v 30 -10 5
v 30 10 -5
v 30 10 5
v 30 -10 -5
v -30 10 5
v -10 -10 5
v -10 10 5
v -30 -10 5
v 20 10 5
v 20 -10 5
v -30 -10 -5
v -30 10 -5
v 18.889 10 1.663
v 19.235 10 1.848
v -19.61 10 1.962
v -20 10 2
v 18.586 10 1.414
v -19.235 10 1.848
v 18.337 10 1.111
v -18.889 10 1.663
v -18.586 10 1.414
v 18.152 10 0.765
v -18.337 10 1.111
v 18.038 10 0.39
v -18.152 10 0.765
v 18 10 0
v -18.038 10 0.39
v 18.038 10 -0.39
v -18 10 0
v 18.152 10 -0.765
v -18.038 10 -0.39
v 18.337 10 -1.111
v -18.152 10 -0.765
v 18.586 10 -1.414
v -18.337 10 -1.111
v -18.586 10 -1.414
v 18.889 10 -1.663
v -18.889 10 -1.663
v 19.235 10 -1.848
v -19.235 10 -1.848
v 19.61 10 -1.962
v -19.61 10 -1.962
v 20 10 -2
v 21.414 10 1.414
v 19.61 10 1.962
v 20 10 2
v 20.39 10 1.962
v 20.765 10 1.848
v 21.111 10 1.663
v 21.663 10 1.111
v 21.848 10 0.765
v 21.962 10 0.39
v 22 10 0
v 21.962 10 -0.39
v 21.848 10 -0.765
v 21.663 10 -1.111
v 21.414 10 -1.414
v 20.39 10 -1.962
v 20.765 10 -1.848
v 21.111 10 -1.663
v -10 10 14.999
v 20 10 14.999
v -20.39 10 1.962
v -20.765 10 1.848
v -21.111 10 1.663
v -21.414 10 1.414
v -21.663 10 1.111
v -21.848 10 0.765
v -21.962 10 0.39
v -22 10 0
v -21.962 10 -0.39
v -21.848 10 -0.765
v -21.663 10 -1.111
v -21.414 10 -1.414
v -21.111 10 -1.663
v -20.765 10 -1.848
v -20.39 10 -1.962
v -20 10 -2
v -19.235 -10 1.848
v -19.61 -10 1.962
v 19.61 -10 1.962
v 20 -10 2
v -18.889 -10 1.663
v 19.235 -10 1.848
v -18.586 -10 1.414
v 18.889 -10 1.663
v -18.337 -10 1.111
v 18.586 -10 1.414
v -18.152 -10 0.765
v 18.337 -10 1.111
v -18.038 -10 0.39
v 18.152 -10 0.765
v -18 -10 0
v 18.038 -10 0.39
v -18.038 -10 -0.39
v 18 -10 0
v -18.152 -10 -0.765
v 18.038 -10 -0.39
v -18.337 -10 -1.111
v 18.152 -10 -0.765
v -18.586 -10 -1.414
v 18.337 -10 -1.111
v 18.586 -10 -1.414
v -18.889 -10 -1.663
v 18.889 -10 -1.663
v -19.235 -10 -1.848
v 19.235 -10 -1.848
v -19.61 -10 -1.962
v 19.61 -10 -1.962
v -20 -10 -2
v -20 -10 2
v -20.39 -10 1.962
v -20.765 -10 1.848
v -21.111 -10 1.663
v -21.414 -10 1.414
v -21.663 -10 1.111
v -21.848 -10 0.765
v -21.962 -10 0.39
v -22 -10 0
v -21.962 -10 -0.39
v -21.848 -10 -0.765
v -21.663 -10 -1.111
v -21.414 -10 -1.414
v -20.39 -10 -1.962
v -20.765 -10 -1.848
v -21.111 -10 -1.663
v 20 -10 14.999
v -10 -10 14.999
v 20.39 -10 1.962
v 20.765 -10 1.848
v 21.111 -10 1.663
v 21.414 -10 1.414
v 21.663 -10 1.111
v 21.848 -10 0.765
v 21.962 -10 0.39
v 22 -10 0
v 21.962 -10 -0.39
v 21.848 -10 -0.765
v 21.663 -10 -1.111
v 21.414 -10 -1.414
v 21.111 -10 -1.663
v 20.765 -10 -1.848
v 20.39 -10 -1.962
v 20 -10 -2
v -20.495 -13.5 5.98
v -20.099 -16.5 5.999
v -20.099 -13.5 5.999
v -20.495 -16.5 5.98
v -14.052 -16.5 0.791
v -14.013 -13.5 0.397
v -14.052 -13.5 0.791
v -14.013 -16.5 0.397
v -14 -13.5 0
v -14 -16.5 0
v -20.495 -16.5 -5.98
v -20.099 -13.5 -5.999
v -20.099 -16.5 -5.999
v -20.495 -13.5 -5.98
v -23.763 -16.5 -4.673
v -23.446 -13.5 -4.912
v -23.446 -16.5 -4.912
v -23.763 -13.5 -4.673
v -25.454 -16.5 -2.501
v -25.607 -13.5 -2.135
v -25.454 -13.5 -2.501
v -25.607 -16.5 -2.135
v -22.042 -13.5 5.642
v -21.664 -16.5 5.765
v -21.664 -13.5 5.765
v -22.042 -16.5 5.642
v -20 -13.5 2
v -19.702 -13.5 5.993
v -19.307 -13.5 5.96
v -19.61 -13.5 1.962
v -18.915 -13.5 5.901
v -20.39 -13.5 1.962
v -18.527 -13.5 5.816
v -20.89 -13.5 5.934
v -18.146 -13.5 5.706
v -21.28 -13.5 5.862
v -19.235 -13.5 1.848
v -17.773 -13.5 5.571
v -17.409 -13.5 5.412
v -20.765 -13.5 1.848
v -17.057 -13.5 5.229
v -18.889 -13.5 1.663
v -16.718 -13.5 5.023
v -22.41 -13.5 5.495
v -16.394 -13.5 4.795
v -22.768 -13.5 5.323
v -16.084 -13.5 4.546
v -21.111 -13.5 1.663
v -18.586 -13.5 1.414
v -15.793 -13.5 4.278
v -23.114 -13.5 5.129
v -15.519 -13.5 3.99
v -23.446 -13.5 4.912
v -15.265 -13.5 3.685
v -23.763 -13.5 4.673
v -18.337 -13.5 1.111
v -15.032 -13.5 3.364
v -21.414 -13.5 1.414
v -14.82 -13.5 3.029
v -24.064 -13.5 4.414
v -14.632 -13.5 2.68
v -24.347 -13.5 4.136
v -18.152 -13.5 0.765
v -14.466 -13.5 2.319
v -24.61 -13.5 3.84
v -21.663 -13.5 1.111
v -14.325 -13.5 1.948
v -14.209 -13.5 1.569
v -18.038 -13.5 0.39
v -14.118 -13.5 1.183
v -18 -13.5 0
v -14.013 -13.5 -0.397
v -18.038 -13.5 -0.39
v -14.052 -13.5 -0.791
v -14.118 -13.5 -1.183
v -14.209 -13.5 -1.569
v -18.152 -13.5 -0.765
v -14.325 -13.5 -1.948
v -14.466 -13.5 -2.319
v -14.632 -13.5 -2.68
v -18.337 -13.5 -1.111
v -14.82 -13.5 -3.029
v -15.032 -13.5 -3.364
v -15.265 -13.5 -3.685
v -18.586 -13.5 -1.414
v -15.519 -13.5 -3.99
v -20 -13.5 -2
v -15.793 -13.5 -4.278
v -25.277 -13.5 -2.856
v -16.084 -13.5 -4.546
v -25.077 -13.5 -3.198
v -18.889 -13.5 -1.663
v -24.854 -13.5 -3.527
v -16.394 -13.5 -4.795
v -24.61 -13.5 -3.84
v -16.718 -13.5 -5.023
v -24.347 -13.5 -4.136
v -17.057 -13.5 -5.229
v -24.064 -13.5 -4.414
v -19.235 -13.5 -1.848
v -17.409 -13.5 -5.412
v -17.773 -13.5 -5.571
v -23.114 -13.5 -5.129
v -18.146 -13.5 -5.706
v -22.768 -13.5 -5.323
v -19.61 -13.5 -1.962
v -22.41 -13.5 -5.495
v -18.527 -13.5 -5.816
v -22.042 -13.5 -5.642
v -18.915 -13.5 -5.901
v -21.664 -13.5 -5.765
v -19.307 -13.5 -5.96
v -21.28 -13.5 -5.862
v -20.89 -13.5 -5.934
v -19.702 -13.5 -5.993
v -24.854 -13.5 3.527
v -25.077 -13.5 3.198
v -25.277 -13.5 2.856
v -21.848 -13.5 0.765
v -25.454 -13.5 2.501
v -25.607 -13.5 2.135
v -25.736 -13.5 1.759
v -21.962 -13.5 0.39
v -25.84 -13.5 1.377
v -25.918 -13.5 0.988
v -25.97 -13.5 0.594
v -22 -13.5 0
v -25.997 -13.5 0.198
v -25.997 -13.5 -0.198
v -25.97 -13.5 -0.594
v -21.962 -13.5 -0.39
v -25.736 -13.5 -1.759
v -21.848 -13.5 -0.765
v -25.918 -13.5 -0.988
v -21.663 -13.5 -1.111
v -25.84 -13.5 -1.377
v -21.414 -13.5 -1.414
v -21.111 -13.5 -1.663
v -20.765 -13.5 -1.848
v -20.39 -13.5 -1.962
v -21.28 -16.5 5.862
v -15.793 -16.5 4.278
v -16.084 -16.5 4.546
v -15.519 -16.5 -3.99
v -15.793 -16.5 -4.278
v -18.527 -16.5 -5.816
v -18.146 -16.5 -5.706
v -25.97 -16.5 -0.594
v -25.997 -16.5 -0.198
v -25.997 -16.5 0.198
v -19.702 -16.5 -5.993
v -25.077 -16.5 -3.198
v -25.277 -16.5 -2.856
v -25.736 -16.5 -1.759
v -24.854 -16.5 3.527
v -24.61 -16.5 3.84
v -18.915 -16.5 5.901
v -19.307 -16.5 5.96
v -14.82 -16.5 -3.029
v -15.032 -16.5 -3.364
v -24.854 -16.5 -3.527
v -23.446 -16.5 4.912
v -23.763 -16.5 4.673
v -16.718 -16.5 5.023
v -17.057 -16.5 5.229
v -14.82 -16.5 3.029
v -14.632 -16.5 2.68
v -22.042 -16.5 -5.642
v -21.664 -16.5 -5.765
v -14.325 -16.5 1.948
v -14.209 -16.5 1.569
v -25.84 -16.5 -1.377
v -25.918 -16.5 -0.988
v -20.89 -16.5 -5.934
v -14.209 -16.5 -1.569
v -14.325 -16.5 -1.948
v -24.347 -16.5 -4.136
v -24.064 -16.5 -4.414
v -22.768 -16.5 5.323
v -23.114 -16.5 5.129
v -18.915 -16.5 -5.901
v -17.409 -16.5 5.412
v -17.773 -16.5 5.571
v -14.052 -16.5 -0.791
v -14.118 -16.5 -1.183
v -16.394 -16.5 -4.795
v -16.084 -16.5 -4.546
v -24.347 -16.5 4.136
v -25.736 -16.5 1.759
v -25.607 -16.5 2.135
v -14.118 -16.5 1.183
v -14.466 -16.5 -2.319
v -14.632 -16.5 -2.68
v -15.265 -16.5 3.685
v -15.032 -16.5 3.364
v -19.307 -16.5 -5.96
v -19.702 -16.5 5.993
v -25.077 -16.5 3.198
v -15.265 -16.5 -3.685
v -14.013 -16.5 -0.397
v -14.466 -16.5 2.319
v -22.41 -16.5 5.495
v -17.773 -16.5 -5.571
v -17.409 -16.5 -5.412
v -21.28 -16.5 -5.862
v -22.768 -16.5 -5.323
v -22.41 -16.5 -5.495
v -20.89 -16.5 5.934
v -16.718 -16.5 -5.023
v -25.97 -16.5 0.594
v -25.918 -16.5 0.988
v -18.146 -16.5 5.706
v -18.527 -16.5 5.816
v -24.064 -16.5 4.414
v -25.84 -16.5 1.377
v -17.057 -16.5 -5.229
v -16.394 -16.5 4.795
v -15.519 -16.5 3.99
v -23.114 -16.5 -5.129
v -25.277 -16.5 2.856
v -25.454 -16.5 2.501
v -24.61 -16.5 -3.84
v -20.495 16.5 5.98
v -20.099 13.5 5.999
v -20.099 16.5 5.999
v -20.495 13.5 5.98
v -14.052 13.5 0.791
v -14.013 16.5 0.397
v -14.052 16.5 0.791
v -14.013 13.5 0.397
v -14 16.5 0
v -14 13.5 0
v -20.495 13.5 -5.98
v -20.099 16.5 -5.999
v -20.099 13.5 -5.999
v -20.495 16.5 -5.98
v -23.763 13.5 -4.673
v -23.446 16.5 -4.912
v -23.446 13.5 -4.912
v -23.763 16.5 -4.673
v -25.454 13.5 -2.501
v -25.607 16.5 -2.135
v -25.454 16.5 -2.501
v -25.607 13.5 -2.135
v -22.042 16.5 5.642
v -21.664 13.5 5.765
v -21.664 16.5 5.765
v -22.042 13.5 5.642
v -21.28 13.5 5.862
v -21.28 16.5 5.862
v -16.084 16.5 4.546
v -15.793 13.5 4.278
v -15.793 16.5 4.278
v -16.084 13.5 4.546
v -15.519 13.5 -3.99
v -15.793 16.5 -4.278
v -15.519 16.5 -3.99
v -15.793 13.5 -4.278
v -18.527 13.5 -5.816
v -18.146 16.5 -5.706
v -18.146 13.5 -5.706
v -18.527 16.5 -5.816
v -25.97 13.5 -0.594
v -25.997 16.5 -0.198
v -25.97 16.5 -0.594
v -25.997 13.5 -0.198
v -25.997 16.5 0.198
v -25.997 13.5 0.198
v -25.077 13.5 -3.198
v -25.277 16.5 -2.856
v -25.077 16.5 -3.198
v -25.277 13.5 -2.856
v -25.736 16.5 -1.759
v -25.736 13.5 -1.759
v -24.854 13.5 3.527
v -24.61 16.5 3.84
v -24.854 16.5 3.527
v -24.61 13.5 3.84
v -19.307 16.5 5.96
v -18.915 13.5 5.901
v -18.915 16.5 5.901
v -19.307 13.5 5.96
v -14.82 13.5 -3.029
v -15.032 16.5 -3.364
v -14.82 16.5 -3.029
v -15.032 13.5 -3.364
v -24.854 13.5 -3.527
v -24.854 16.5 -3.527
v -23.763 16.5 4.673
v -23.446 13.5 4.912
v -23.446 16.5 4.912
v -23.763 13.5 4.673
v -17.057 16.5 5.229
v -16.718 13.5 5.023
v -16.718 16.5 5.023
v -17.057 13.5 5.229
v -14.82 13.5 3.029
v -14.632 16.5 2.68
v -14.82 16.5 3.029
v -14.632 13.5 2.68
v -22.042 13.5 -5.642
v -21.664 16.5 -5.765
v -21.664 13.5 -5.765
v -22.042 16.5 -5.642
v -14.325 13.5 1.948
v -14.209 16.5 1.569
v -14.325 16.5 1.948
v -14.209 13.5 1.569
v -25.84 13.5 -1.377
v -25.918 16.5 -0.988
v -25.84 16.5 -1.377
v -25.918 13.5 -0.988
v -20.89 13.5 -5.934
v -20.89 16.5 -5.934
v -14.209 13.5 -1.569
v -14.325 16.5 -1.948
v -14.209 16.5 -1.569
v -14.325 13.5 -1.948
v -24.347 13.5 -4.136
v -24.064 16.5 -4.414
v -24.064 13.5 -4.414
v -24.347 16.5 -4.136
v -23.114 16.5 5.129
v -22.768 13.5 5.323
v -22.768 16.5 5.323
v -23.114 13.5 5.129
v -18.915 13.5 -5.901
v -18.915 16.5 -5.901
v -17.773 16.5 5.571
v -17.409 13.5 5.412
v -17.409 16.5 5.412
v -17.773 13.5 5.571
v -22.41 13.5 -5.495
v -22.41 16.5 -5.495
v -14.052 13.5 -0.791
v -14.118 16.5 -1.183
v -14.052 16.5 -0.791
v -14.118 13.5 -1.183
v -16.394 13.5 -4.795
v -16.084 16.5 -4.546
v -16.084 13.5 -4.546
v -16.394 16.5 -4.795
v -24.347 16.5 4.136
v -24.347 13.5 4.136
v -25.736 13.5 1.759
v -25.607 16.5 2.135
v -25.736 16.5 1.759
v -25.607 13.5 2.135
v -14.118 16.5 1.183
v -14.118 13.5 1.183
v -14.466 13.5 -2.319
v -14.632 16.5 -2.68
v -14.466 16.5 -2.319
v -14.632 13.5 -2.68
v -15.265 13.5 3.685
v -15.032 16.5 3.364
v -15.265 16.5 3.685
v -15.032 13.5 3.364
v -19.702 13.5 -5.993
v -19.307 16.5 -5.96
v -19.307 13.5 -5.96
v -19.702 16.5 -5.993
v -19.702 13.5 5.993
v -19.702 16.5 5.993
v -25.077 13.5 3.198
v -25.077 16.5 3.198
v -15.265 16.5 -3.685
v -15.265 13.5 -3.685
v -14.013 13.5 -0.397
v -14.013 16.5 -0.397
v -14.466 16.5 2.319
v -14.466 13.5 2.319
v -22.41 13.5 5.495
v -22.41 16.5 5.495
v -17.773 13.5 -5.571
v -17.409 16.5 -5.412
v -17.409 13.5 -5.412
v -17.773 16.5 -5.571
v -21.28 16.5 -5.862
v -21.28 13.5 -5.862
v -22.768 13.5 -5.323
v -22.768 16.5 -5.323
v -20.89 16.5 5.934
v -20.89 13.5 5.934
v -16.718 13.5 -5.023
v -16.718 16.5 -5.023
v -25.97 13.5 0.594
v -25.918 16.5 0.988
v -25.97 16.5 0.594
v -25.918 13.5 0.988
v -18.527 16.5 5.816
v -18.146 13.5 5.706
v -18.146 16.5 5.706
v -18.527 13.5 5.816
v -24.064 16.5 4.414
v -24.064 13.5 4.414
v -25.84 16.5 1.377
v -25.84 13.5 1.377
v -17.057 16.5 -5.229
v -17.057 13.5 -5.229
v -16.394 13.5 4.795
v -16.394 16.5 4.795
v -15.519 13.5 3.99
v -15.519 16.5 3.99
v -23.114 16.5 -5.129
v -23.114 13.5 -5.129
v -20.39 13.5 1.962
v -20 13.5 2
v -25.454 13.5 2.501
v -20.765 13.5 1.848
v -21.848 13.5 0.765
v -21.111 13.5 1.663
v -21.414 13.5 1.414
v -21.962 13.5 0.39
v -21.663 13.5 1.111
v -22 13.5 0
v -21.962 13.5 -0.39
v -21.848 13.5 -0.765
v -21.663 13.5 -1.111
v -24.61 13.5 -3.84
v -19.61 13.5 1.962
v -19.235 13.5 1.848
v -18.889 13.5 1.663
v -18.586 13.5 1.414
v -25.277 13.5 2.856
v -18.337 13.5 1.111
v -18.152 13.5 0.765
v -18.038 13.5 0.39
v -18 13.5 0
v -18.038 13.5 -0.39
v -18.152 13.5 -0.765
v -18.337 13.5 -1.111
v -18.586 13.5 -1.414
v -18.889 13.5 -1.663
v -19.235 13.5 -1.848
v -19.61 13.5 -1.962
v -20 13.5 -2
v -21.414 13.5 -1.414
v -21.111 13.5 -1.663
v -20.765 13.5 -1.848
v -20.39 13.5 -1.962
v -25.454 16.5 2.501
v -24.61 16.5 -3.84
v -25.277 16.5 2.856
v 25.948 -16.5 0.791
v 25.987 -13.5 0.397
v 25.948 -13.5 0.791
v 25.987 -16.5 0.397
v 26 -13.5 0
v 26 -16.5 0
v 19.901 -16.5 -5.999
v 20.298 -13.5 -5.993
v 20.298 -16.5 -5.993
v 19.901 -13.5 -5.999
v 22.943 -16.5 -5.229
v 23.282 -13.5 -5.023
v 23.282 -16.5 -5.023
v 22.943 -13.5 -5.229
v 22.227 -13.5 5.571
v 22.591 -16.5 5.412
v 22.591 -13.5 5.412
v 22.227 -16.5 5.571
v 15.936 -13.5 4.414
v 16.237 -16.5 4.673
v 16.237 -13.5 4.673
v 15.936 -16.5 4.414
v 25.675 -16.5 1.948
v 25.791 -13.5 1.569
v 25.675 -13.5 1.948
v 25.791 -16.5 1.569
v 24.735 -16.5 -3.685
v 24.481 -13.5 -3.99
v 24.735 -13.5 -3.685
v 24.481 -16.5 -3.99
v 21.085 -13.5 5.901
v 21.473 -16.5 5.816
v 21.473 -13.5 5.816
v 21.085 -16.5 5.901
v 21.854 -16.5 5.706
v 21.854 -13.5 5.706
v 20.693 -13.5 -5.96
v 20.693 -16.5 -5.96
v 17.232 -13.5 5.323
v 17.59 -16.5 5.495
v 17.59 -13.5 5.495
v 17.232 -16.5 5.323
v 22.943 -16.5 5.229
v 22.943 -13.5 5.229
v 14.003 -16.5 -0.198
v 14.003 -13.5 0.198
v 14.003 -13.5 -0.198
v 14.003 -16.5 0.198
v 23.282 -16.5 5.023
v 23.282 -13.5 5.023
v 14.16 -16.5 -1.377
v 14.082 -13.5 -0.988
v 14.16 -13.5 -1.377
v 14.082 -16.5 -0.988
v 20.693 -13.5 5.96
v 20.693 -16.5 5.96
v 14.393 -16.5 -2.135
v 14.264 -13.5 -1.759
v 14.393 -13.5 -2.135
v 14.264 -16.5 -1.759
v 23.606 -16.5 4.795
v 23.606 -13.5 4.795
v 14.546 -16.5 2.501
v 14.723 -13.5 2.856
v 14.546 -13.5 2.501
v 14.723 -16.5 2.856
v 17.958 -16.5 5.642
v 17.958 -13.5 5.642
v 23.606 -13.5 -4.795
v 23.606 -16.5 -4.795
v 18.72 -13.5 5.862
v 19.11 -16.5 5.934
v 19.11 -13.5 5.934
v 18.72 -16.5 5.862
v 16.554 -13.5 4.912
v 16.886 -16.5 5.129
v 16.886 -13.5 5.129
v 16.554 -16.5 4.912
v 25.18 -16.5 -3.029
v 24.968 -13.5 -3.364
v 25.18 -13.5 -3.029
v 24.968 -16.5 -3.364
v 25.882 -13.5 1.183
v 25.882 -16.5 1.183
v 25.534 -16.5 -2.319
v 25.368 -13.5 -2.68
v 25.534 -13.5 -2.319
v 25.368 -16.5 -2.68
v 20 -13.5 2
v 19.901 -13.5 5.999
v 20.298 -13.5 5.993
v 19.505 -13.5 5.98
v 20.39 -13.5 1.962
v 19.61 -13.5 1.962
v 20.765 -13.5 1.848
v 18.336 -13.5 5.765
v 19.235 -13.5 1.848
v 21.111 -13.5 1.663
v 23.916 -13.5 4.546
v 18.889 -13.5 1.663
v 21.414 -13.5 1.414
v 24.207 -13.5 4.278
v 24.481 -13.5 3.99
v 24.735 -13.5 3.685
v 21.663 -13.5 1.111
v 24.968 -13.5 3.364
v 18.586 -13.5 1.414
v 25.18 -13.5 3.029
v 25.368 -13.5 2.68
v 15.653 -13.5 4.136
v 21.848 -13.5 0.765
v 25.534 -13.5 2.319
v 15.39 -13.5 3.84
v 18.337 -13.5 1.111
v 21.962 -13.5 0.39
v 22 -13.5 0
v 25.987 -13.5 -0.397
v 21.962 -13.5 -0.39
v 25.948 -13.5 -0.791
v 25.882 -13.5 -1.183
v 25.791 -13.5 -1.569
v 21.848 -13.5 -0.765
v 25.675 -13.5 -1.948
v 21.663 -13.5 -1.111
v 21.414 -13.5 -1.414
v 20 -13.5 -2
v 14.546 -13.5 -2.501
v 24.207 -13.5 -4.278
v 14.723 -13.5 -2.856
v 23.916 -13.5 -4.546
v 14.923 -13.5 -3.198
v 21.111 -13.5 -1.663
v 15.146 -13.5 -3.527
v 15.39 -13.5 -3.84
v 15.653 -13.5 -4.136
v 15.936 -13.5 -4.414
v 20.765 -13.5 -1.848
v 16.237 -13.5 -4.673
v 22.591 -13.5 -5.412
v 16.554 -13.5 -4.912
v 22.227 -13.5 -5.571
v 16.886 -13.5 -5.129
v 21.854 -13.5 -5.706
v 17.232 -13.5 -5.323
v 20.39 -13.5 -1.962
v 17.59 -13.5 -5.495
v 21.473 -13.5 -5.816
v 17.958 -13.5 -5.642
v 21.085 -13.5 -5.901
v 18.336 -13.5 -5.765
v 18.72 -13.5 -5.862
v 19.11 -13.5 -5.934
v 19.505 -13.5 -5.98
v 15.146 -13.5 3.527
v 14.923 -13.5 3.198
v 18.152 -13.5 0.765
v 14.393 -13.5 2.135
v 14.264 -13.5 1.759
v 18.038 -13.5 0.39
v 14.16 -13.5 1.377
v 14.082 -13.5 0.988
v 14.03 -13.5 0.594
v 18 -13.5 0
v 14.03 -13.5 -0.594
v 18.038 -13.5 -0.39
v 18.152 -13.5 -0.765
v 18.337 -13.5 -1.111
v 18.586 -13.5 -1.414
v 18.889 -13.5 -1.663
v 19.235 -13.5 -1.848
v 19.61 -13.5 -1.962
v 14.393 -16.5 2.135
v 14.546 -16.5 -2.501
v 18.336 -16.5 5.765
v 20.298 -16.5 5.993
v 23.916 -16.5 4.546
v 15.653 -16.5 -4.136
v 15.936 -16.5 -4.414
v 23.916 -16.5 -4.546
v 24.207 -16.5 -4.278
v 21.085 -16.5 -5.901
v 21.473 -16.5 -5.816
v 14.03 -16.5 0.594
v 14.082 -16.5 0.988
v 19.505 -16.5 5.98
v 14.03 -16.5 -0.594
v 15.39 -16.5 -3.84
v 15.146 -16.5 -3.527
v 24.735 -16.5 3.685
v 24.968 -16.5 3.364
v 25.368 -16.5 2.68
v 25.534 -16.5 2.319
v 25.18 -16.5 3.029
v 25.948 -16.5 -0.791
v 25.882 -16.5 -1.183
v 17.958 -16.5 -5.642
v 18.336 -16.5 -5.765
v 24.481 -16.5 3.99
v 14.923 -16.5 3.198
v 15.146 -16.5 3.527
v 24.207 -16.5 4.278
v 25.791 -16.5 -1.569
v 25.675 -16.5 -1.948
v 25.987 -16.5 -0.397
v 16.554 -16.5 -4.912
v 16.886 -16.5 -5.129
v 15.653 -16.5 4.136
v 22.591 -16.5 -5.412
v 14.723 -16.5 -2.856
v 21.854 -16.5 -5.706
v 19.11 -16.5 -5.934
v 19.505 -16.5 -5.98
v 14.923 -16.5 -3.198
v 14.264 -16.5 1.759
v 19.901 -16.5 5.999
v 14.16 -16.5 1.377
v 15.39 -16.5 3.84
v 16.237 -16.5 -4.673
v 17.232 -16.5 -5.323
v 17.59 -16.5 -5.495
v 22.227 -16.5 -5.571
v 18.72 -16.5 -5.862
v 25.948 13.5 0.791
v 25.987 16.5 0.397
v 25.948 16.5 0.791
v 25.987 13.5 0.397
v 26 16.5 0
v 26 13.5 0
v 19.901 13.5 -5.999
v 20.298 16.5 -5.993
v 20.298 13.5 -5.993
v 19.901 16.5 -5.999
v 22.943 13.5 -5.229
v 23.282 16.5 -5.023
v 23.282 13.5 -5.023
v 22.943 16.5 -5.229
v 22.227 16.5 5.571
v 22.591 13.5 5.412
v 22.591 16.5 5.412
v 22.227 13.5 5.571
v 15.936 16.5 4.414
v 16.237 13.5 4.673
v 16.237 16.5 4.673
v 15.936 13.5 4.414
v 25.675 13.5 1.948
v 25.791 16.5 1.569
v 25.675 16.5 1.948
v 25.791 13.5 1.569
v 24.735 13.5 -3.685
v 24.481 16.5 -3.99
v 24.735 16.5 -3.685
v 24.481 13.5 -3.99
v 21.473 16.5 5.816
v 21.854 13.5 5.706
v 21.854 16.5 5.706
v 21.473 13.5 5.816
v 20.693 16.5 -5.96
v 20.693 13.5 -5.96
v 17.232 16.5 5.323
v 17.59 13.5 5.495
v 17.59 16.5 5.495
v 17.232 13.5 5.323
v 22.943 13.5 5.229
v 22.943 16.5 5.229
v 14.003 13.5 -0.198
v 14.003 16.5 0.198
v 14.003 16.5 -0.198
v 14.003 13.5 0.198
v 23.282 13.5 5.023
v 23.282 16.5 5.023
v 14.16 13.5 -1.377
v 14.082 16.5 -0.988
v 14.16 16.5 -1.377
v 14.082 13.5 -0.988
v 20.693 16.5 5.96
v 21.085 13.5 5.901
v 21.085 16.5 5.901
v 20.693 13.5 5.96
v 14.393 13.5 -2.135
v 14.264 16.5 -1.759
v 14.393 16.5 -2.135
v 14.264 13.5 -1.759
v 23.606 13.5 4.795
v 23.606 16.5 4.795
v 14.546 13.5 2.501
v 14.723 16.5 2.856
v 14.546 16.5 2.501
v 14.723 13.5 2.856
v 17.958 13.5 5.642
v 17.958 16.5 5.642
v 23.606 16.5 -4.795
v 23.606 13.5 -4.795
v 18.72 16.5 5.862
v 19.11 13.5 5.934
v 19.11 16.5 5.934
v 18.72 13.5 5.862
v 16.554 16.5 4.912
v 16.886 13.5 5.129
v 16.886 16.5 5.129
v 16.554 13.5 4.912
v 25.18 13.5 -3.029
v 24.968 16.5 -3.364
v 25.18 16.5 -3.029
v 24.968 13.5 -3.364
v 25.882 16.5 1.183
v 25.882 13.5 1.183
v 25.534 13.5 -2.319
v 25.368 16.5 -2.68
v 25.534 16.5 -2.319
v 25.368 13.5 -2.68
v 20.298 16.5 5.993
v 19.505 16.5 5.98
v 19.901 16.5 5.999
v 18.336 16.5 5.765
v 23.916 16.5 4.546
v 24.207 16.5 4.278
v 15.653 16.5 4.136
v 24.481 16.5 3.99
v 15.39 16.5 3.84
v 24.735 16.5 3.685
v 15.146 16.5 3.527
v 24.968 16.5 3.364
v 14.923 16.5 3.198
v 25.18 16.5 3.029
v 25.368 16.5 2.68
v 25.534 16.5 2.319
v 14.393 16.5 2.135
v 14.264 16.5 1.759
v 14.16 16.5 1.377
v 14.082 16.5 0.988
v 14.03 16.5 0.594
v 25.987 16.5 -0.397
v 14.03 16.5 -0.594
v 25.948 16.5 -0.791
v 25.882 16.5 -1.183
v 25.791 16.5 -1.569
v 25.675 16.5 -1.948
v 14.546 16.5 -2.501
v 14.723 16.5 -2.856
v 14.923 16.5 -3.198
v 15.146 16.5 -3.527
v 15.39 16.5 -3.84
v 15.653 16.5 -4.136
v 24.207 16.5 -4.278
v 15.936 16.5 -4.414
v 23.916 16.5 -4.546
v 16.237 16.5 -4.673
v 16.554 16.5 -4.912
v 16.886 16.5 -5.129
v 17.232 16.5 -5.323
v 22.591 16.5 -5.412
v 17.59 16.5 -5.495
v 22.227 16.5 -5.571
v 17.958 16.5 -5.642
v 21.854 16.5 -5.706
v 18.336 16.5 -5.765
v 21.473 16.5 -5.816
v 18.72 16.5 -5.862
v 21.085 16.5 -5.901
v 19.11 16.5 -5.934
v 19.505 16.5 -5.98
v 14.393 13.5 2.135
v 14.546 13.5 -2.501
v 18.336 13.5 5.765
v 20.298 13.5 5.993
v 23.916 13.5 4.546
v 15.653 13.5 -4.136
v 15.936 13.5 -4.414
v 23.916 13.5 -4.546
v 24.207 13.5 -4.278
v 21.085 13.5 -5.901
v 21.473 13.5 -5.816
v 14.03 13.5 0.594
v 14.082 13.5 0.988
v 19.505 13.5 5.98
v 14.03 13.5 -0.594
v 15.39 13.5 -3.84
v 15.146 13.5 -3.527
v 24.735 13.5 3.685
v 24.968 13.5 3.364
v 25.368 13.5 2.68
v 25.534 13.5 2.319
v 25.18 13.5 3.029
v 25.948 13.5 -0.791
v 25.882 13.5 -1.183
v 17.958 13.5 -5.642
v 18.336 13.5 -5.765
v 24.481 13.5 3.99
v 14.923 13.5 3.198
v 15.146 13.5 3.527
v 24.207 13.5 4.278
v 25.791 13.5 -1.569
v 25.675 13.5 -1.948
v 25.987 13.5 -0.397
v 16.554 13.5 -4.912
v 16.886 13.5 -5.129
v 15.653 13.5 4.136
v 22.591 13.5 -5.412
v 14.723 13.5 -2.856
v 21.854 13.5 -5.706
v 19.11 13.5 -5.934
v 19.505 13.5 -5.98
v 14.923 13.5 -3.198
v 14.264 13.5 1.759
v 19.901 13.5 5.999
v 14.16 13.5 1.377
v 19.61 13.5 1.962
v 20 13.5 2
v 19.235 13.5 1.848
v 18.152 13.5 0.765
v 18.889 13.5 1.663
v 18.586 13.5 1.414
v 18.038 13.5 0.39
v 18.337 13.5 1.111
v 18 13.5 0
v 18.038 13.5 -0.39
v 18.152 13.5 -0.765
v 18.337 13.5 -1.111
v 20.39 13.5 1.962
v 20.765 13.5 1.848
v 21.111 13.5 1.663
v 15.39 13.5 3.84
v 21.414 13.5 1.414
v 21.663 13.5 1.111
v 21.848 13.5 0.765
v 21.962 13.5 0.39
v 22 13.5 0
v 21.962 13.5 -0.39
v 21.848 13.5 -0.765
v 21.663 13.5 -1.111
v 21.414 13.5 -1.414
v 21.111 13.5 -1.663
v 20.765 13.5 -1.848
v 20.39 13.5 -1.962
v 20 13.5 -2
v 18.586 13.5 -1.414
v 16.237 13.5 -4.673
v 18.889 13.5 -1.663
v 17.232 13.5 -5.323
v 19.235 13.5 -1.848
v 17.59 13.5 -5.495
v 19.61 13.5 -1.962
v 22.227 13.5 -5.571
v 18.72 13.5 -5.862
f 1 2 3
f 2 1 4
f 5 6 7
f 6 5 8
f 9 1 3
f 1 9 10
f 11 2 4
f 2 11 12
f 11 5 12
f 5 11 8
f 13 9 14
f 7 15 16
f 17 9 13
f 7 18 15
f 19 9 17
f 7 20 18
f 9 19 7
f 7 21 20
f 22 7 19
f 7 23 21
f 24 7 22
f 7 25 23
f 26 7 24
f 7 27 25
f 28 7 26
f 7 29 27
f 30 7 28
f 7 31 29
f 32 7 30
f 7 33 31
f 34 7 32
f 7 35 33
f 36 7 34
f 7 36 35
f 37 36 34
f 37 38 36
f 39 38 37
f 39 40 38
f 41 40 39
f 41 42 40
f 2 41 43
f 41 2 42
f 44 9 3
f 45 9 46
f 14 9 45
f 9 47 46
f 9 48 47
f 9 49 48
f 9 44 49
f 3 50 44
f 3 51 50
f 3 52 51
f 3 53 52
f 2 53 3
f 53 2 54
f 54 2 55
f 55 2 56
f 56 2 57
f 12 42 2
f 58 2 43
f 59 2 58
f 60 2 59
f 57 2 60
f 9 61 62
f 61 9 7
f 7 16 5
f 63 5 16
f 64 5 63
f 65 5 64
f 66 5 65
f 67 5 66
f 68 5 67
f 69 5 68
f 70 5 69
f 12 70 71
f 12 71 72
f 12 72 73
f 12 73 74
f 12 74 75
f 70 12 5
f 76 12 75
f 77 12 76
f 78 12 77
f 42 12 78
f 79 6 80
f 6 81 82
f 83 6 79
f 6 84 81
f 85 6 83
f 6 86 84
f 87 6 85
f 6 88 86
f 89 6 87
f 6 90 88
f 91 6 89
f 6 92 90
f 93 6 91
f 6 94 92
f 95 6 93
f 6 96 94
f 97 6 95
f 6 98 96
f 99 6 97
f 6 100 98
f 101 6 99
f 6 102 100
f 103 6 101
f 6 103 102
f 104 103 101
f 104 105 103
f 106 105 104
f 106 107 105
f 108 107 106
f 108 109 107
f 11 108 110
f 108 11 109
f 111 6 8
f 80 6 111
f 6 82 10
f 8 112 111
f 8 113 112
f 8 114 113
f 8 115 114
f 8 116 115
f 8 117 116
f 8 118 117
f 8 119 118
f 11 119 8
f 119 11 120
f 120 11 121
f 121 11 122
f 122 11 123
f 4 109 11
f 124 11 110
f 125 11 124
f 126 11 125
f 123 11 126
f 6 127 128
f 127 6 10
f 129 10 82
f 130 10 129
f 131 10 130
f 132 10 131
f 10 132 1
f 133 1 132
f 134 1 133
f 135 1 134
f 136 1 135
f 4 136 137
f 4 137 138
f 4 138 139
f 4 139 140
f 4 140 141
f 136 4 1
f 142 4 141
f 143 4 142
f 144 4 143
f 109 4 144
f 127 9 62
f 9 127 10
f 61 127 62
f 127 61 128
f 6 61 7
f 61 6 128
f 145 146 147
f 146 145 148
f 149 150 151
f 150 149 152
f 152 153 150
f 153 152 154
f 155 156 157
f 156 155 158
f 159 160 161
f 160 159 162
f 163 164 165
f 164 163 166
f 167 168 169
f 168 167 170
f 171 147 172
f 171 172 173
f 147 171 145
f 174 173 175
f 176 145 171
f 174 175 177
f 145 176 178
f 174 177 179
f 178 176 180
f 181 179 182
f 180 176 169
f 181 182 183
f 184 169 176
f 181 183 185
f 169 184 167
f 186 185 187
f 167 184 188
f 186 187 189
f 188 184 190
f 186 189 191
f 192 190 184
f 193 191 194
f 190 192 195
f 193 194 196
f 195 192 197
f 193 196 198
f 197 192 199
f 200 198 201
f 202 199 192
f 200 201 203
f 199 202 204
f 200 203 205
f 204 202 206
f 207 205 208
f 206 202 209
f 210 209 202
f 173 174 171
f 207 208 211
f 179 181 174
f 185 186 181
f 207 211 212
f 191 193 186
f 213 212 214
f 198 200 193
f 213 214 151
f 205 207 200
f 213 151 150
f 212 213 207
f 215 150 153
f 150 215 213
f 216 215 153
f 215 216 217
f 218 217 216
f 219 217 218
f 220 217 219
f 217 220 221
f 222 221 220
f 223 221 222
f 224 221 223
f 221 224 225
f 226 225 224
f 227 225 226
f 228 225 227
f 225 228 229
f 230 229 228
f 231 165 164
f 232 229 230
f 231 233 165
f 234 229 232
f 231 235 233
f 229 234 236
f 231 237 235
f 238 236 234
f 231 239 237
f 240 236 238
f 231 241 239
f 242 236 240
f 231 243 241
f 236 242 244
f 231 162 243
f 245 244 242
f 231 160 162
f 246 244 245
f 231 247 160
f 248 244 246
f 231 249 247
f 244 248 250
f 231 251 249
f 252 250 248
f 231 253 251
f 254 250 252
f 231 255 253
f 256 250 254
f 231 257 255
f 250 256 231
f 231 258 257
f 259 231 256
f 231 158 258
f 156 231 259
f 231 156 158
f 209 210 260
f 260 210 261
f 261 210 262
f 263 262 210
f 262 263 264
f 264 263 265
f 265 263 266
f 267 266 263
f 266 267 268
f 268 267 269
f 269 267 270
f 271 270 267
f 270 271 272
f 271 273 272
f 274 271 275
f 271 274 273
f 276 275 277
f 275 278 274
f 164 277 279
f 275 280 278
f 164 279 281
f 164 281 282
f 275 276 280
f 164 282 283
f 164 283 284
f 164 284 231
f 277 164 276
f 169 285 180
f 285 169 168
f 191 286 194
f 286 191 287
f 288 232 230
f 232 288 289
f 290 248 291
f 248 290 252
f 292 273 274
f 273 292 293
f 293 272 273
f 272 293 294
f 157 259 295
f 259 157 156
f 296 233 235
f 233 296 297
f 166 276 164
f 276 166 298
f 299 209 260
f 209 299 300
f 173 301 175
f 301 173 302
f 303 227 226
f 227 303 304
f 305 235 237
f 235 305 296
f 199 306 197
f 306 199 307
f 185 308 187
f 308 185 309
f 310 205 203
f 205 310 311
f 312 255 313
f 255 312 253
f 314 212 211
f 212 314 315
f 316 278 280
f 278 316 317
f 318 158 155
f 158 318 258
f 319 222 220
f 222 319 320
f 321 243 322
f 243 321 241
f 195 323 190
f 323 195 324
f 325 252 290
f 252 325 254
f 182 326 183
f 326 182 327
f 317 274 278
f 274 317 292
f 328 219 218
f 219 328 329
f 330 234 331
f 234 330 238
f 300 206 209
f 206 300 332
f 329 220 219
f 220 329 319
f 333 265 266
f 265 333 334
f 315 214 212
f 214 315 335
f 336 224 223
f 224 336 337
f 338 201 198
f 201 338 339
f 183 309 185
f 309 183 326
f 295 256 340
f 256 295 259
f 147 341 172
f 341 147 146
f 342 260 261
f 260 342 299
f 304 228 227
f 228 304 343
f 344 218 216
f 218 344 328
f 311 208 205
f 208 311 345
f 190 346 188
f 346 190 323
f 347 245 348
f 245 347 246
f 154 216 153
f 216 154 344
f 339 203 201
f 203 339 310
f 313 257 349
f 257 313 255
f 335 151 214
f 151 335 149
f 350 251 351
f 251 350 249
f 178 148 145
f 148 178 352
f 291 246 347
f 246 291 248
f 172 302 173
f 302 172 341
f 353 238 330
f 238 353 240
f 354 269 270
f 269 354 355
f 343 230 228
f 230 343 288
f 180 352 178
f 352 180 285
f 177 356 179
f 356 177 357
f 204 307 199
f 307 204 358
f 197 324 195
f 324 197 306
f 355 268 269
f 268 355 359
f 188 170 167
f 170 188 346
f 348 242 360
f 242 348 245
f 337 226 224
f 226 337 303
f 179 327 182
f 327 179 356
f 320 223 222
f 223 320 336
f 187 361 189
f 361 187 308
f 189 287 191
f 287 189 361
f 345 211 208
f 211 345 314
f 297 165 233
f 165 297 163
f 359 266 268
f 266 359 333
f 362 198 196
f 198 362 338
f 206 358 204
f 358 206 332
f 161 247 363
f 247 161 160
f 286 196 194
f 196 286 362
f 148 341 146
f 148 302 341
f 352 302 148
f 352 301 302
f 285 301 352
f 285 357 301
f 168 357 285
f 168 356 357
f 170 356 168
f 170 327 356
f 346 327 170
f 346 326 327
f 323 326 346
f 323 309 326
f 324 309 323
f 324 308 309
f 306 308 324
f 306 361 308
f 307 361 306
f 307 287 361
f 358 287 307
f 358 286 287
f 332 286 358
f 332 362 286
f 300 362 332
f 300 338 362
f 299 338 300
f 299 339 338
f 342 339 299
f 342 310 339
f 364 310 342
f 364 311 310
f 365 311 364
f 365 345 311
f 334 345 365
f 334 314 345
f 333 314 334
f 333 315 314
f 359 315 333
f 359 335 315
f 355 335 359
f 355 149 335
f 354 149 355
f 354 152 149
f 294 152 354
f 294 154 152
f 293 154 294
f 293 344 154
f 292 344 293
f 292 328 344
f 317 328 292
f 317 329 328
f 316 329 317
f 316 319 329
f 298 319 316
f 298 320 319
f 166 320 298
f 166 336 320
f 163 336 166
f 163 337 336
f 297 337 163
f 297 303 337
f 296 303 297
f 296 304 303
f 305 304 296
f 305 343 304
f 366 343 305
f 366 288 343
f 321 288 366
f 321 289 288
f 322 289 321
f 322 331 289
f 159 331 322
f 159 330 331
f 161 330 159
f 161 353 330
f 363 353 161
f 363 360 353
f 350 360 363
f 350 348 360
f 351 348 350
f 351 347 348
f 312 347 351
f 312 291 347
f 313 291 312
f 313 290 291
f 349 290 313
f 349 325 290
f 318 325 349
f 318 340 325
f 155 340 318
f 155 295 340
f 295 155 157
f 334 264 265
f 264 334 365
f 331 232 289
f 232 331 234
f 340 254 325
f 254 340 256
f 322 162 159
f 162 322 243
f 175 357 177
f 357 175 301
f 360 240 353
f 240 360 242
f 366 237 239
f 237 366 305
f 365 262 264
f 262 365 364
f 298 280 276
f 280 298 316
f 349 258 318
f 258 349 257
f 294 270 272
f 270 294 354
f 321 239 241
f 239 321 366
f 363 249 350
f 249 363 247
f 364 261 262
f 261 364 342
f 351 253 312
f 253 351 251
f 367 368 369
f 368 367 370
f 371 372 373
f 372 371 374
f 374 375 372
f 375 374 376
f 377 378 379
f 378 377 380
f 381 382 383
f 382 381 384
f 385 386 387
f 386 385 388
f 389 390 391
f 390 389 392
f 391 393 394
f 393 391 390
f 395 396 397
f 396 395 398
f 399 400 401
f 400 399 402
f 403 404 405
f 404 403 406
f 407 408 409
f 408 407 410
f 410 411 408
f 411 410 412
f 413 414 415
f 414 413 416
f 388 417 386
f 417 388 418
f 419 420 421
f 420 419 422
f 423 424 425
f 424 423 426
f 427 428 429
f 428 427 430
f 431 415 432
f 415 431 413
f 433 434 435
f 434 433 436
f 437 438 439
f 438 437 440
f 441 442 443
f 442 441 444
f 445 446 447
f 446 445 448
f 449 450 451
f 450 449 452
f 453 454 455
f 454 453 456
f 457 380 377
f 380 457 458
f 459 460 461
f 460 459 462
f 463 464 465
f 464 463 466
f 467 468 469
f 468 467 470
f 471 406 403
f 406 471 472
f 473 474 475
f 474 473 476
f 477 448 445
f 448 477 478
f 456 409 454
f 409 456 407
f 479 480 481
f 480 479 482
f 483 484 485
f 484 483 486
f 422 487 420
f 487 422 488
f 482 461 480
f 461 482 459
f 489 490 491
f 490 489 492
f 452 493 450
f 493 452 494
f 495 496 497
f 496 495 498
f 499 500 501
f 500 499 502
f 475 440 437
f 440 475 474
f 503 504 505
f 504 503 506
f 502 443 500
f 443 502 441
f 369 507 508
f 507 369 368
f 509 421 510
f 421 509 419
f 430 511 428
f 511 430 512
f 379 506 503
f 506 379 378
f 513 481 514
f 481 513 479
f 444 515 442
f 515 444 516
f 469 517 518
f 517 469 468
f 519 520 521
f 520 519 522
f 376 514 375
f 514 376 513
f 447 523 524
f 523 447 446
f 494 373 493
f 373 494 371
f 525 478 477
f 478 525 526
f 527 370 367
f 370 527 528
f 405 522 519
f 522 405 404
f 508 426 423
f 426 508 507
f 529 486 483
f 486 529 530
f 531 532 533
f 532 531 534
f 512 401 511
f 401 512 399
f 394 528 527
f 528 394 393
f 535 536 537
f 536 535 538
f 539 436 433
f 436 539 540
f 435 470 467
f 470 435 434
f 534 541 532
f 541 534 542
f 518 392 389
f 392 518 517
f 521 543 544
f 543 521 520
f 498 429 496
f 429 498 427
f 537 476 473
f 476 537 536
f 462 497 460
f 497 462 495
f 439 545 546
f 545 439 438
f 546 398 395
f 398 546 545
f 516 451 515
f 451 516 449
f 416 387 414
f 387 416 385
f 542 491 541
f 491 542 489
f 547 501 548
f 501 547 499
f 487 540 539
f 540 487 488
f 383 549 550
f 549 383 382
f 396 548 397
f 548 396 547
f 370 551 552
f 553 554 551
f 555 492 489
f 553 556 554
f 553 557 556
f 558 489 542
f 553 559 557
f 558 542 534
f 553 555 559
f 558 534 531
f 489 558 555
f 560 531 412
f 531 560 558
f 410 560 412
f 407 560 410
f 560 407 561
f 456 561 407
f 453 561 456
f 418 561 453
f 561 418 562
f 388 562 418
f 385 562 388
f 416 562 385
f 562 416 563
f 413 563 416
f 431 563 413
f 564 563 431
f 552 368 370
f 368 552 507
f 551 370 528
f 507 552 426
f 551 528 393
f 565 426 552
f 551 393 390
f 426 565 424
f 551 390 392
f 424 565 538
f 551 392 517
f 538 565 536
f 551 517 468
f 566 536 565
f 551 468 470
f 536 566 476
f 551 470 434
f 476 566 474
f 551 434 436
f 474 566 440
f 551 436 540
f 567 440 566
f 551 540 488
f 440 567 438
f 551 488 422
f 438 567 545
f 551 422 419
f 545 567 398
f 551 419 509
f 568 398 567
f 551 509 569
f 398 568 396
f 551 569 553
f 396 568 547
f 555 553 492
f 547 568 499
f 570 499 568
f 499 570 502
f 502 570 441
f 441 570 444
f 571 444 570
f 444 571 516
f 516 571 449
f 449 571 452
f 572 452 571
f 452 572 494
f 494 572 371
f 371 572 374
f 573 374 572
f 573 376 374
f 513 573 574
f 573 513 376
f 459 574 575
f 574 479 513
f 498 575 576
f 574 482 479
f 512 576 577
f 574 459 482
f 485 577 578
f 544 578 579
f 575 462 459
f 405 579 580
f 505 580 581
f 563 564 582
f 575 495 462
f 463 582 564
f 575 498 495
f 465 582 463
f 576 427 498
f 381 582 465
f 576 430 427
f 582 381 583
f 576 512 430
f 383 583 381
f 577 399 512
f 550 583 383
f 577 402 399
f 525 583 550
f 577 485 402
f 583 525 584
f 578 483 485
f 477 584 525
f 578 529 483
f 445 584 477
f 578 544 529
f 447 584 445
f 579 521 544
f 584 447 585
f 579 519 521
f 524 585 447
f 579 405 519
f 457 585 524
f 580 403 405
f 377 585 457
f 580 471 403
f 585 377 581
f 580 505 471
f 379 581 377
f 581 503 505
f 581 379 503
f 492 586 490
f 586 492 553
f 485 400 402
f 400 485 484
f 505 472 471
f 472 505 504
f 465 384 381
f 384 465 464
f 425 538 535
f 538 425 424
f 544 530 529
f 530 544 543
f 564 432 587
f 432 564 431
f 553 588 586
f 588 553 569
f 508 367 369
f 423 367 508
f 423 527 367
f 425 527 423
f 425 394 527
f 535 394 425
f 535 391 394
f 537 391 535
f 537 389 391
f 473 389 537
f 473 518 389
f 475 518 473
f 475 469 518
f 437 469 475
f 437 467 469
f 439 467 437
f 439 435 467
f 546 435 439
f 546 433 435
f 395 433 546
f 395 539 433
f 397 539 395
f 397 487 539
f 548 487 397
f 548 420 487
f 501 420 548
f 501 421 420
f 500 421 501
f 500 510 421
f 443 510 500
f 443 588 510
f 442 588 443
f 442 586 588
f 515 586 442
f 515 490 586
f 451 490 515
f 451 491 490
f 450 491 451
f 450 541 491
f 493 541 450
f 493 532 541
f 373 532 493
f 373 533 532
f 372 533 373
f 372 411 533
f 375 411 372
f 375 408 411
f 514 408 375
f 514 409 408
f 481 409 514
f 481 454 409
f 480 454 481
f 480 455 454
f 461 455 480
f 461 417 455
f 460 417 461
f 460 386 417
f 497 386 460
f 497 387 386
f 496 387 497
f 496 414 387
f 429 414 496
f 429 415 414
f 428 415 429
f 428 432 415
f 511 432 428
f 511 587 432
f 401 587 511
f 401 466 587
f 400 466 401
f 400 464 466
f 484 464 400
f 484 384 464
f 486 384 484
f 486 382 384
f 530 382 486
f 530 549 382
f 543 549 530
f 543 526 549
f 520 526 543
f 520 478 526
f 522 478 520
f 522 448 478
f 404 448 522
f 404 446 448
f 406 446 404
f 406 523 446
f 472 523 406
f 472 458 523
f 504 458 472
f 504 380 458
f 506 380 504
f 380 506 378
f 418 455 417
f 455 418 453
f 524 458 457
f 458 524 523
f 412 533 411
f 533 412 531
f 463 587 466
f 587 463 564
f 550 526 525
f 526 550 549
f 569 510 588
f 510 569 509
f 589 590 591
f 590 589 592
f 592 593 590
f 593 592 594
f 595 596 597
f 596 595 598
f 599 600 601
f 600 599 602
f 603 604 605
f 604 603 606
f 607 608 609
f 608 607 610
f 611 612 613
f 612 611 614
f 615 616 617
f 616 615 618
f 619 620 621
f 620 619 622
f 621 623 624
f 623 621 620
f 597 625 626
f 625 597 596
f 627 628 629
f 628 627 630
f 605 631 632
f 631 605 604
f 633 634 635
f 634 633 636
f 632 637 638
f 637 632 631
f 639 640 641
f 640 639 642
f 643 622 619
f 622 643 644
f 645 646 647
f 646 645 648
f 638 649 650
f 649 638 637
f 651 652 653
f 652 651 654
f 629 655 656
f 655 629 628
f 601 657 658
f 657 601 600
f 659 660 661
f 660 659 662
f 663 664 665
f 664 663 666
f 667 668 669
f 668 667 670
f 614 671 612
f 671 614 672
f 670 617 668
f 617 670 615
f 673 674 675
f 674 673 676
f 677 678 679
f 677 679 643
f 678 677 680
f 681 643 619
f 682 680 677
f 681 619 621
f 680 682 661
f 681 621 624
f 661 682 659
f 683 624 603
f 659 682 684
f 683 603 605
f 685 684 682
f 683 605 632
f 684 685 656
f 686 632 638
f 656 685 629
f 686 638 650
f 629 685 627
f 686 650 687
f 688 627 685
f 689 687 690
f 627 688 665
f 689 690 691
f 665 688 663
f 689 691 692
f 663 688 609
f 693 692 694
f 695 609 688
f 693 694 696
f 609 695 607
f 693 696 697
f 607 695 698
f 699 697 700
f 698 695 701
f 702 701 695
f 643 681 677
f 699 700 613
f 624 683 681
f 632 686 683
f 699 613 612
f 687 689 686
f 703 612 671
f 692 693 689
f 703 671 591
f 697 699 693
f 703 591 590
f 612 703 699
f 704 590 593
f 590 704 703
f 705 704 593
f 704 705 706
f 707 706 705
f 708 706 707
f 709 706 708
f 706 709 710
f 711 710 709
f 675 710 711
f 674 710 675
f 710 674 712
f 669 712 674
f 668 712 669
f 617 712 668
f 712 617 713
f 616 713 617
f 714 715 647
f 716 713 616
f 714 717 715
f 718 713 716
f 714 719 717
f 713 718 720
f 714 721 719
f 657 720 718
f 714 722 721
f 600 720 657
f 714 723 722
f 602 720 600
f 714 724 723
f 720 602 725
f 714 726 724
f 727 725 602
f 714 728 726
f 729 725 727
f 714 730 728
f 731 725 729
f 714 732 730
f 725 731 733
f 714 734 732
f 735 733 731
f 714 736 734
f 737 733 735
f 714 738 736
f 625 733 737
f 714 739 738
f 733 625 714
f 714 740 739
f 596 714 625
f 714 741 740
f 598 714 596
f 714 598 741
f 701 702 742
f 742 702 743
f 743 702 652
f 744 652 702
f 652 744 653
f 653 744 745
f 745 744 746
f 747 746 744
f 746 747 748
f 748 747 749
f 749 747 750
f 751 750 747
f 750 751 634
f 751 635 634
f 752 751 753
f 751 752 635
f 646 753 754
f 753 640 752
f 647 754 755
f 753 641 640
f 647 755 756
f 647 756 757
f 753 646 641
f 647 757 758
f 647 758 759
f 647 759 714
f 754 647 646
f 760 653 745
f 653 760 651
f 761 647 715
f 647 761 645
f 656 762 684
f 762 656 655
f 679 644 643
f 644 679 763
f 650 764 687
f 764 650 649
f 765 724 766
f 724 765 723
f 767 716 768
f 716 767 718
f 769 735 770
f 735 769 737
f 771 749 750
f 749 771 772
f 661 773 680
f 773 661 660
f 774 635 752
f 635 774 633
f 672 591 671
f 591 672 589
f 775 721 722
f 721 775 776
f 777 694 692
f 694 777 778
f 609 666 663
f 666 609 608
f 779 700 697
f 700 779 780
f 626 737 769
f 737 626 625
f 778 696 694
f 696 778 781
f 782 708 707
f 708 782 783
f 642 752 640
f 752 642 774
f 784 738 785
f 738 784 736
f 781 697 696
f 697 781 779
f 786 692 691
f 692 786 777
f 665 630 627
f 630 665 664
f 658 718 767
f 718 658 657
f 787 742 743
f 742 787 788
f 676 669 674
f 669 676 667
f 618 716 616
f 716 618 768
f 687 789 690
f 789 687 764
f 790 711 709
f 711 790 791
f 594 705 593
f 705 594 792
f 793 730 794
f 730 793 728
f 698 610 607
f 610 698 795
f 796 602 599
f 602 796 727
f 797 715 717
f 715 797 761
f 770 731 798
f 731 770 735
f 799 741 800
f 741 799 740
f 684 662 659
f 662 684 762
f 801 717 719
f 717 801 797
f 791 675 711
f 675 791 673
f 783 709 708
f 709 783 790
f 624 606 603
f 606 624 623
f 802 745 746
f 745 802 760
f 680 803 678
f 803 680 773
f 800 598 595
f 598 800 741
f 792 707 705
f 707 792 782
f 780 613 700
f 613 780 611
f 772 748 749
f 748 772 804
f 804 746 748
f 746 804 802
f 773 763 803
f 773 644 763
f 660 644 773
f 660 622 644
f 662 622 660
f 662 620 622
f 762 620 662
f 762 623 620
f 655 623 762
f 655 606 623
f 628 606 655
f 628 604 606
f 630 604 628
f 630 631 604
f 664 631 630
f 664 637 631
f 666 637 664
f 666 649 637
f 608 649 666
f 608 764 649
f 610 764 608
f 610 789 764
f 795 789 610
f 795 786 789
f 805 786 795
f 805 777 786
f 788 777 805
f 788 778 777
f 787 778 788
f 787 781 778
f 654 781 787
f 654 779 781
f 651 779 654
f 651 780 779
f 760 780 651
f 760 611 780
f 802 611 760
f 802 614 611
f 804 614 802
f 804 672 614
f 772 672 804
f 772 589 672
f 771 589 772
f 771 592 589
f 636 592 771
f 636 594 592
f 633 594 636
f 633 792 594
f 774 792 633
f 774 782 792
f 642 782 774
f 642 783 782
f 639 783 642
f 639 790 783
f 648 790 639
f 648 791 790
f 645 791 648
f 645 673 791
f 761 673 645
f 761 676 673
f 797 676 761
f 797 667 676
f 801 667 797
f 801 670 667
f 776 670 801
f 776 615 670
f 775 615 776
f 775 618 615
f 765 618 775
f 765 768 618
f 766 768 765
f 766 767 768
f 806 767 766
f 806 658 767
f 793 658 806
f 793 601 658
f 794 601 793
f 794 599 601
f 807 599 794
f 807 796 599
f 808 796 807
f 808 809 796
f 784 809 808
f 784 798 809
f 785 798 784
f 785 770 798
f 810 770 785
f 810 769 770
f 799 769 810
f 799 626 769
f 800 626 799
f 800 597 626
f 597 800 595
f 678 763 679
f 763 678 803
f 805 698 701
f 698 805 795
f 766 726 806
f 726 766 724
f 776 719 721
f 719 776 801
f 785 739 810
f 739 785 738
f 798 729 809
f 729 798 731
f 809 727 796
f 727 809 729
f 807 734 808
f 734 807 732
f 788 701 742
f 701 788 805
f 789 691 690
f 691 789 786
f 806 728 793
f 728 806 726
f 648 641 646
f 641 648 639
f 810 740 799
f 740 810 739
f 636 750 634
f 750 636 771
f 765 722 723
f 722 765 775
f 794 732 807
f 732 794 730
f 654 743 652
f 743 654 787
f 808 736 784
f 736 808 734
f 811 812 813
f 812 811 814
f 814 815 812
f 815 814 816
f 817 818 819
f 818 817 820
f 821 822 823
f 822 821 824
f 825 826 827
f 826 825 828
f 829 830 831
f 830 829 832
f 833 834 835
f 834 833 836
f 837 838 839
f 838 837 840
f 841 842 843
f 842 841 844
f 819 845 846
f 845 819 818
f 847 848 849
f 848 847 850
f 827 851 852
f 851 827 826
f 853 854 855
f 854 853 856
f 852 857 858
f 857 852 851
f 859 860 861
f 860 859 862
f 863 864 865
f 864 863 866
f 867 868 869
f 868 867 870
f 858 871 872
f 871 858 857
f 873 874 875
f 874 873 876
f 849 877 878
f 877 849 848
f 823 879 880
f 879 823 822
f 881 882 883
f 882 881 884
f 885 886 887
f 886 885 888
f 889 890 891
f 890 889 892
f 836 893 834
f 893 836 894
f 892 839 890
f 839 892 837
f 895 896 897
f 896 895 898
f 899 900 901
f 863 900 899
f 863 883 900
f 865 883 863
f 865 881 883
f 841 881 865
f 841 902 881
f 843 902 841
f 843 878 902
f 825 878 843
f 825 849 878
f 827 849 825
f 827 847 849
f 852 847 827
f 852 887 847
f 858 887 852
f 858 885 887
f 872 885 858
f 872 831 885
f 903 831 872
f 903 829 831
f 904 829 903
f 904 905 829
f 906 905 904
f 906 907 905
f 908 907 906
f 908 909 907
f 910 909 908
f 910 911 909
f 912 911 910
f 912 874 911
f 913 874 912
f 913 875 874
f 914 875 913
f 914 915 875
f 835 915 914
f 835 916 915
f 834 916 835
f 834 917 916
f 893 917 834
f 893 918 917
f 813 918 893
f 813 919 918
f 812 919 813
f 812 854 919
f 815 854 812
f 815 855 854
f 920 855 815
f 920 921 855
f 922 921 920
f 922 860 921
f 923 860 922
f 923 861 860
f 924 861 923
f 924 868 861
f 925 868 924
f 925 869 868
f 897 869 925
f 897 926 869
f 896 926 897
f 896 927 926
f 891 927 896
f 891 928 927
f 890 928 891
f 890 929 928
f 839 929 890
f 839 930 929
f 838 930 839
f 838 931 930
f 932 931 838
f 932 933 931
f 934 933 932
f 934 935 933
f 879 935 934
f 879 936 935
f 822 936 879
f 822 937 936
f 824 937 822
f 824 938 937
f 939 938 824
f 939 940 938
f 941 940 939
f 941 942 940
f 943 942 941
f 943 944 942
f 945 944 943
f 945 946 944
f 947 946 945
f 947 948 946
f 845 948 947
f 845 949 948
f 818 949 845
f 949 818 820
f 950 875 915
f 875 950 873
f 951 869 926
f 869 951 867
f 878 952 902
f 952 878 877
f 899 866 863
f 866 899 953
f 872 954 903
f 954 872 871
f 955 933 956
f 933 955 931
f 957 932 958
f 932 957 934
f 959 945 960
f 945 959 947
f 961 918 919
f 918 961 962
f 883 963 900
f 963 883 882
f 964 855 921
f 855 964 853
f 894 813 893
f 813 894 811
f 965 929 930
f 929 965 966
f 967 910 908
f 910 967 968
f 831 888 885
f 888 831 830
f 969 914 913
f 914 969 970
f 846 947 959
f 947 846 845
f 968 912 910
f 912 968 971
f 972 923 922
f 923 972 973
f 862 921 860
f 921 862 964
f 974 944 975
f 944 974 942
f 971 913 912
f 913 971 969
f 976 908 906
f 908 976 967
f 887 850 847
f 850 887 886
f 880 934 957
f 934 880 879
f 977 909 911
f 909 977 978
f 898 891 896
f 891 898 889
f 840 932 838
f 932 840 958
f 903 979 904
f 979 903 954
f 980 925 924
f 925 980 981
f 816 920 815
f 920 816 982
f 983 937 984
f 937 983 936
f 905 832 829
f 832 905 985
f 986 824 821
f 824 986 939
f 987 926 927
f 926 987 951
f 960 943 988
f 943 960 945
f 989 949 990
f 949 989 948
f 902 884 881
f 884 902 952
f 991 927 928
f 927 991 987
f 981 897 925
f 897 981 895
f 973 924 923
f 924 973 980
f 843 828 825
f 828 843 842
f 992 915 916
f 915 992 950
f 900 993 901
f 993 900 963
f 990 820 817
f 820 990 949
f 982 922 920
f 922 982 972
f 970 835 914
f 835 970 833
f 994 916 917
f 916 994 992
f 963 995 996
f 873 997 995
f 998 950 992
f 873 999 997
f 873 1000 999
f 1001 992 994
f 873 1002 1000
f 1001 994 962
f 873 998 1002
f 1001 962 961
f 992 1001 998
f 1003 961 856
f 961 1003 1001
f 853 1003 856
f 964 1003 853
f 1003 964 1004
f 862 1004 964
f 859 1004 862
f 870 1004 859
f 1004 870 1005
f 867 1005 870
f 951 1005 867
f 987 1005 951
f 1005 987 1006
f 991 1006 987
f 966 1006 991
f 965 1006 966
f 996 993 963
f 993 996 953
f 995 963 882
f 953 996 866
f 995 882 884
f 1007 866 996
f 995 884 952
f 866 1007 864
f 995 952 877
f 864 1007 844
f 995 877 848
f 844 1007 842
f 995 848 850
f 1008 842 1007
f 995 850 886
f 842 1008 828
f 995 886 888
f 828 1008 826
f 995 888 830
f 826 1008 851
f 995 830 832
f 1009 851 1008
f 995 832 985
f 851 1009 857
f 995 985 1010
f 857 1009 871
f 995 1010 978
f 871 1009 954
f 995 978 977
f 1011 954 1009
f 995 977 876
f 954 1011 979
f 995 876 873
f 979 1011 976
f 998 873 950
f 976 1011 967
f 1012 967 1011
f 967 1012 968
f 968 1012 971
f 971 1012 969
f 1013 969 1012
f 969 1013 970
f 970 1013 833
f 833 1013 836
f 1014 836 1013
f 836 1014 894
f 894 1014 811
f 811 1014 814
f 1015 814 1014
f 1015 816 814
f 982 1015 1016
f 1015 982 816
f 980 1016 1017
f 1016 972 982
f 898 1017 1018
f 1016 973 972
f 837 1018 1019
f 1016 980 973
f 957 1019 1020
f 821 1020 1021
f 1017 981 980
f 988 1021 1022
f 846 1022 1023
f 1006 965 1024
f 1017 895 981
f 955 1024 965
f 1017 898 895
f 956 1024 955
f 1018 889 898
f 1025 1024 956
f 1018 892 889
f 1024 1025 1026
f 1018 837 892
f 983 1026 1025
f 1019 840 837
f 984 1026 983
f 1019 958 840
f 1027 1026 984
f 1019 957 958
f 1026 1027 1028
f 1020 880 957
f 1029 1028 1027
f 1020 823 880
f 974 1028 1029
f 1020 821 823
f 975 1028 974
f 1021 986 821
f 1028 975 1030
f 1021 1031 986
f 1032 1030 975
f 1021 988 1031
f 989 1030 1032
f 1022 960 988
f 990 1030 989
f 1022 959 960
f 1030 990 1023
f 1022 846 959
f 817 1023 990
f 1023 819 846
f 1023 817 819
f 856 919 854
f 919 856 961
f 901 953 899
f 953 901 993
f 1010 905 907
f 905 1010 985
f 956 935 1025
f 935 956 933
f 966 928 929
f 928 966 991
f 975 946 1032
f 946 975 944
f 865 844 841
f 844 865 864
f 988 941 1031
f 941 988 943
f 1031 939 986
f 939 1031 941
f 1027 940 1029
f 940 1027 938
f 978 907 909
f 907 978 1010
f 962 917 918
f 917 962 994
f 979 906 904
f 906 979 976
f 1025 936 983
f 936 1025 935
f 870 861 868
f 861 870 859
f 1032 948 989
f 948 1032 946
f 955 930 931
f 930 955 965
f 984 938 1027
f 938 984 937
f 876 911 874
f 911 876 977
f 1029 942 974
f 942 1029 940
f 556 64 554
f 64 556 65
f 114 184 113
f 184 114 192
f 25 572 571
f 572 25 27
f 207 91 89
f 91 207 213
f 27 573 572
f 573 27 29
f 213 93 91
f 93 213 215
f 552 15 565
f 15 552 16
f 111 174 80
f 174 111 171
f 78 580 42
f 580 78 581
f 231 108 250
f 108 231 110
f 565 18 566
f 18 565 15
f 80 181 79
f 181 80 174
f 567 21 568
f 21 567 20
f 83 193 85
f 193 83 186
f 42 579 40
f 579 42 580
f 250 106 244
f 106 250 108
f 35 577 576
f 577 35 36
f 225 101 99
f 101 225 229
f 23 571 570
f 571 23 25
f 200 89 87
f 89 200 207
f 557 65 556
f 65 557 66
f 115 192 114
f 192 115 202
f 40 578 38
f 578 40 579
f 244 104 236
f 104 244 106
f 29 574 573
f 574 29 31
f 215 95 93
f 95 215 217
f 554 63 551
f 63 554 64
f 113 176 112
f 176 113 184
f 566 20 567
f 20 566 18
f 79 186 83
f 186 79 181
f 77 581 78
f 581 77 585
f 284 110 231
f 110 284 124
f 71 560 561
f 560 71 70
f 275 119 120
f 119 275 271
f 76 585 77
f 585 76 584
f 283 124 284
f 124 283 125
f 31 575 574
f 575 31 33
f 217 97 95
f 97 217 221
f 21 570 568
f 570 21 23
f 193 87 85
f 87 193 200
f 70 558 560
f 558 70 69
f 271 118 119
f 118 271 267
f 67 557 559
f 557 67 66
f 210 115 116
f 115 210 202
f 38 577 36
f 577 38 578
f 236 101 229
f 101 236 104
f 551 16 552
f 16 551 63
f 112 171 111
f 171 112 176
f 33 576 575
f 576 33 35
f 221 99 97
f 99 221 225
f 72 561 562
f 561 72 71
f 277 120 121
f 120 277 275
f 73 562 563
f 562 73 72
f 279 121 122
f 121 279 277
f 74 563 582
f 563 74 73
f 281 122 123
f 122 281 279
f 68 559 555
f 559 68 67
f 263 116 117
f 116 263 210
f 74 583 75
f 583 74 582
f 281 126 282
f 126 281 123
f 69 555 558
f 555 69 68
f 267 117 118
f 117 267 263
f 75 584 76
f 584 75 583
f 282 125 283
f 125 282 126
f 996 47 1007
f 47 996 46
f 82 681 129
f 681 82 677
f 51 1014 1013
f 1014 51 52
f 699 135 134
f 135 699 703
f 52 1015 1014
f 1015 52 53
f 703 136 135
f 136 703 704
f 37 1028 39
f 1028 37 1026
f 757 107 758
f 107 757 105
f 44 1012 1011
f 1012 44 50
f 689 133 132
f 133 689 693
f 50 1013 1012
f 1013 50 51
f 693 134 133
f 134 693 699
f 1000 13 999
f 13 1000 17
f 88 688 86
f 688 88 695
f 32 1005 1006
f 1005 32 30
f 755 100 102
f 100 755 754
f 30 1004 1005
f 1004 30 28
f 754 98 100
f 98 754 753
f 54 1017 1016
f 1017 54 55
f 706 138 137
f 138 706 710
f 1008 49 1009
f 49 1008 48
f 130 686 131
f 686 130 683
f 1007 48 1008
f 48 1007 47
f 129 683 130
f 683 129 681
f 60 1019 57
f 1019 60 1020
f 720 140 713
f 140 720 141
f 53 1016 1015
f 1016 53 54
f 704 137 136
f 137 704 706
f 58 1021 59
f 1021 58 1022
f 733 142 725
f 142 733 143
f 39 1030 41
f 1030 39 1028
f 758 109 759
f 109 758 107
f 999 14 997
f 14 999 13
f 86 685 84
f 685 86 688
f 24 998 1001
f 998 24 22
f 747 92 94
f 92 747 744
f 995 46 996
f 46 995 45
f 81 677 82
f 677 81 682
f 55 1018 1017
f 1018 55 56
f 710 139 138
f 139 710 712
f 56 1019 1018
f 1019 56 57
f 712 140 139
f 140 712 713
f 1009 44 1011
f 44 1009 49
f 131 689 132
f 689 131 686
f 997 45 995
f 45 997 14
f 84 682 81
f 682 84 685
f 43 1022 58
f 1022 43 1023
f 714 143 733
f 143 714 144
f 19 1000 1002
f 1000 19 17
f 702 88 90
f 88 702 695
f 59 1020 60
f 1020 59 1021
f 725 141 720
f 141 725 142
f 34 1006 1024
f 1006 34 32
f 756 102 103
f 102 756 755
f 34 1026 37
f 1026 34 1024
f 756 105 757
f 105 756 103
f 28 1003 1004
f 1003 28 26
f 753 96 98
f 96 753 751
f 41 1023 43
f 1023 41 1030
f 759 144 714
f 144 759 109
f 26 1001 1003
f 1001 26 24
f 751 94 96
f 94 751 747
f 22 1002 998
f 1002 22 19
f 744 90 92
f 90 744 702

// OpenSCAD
$fa = 1;
$fs = 0.4;
wheel_radious = 6;
// Car body base
cube([60,20,10],center=true);
// Car body top
translate([5,0,10 - 0.001])
    cube([30,20,10],center=true);
// Front left wheel
translate([-20,-15,0])
    rotate([90,0,0])
    cylinder(h=3,r=wheel_radious,center=true);
// Front right wheel
translate([-20,15,0])
    rotate([90,0,0])
    cylinder(h=3,r=wheel_radious,center=true);
// Rear left wheel
translate([20,-15,0])
    rotate([90,0,0])
    cylinder(h=3,r=wheel_radious,center=true);
// Rear right wheel
translate([20,15,0])
    rotate([90,0,0])
    cylinder(h=3,r=wheel_radious,center=true);
// Front axle
translate([-20,0,0])
    rotate([90,0,0])
    cylinder(h=30,r=2,center=true);
// Rear axle
translate([20,0,0])
    rotate([90,0,0])
    cylinder(h=30,r=2,center=true);
